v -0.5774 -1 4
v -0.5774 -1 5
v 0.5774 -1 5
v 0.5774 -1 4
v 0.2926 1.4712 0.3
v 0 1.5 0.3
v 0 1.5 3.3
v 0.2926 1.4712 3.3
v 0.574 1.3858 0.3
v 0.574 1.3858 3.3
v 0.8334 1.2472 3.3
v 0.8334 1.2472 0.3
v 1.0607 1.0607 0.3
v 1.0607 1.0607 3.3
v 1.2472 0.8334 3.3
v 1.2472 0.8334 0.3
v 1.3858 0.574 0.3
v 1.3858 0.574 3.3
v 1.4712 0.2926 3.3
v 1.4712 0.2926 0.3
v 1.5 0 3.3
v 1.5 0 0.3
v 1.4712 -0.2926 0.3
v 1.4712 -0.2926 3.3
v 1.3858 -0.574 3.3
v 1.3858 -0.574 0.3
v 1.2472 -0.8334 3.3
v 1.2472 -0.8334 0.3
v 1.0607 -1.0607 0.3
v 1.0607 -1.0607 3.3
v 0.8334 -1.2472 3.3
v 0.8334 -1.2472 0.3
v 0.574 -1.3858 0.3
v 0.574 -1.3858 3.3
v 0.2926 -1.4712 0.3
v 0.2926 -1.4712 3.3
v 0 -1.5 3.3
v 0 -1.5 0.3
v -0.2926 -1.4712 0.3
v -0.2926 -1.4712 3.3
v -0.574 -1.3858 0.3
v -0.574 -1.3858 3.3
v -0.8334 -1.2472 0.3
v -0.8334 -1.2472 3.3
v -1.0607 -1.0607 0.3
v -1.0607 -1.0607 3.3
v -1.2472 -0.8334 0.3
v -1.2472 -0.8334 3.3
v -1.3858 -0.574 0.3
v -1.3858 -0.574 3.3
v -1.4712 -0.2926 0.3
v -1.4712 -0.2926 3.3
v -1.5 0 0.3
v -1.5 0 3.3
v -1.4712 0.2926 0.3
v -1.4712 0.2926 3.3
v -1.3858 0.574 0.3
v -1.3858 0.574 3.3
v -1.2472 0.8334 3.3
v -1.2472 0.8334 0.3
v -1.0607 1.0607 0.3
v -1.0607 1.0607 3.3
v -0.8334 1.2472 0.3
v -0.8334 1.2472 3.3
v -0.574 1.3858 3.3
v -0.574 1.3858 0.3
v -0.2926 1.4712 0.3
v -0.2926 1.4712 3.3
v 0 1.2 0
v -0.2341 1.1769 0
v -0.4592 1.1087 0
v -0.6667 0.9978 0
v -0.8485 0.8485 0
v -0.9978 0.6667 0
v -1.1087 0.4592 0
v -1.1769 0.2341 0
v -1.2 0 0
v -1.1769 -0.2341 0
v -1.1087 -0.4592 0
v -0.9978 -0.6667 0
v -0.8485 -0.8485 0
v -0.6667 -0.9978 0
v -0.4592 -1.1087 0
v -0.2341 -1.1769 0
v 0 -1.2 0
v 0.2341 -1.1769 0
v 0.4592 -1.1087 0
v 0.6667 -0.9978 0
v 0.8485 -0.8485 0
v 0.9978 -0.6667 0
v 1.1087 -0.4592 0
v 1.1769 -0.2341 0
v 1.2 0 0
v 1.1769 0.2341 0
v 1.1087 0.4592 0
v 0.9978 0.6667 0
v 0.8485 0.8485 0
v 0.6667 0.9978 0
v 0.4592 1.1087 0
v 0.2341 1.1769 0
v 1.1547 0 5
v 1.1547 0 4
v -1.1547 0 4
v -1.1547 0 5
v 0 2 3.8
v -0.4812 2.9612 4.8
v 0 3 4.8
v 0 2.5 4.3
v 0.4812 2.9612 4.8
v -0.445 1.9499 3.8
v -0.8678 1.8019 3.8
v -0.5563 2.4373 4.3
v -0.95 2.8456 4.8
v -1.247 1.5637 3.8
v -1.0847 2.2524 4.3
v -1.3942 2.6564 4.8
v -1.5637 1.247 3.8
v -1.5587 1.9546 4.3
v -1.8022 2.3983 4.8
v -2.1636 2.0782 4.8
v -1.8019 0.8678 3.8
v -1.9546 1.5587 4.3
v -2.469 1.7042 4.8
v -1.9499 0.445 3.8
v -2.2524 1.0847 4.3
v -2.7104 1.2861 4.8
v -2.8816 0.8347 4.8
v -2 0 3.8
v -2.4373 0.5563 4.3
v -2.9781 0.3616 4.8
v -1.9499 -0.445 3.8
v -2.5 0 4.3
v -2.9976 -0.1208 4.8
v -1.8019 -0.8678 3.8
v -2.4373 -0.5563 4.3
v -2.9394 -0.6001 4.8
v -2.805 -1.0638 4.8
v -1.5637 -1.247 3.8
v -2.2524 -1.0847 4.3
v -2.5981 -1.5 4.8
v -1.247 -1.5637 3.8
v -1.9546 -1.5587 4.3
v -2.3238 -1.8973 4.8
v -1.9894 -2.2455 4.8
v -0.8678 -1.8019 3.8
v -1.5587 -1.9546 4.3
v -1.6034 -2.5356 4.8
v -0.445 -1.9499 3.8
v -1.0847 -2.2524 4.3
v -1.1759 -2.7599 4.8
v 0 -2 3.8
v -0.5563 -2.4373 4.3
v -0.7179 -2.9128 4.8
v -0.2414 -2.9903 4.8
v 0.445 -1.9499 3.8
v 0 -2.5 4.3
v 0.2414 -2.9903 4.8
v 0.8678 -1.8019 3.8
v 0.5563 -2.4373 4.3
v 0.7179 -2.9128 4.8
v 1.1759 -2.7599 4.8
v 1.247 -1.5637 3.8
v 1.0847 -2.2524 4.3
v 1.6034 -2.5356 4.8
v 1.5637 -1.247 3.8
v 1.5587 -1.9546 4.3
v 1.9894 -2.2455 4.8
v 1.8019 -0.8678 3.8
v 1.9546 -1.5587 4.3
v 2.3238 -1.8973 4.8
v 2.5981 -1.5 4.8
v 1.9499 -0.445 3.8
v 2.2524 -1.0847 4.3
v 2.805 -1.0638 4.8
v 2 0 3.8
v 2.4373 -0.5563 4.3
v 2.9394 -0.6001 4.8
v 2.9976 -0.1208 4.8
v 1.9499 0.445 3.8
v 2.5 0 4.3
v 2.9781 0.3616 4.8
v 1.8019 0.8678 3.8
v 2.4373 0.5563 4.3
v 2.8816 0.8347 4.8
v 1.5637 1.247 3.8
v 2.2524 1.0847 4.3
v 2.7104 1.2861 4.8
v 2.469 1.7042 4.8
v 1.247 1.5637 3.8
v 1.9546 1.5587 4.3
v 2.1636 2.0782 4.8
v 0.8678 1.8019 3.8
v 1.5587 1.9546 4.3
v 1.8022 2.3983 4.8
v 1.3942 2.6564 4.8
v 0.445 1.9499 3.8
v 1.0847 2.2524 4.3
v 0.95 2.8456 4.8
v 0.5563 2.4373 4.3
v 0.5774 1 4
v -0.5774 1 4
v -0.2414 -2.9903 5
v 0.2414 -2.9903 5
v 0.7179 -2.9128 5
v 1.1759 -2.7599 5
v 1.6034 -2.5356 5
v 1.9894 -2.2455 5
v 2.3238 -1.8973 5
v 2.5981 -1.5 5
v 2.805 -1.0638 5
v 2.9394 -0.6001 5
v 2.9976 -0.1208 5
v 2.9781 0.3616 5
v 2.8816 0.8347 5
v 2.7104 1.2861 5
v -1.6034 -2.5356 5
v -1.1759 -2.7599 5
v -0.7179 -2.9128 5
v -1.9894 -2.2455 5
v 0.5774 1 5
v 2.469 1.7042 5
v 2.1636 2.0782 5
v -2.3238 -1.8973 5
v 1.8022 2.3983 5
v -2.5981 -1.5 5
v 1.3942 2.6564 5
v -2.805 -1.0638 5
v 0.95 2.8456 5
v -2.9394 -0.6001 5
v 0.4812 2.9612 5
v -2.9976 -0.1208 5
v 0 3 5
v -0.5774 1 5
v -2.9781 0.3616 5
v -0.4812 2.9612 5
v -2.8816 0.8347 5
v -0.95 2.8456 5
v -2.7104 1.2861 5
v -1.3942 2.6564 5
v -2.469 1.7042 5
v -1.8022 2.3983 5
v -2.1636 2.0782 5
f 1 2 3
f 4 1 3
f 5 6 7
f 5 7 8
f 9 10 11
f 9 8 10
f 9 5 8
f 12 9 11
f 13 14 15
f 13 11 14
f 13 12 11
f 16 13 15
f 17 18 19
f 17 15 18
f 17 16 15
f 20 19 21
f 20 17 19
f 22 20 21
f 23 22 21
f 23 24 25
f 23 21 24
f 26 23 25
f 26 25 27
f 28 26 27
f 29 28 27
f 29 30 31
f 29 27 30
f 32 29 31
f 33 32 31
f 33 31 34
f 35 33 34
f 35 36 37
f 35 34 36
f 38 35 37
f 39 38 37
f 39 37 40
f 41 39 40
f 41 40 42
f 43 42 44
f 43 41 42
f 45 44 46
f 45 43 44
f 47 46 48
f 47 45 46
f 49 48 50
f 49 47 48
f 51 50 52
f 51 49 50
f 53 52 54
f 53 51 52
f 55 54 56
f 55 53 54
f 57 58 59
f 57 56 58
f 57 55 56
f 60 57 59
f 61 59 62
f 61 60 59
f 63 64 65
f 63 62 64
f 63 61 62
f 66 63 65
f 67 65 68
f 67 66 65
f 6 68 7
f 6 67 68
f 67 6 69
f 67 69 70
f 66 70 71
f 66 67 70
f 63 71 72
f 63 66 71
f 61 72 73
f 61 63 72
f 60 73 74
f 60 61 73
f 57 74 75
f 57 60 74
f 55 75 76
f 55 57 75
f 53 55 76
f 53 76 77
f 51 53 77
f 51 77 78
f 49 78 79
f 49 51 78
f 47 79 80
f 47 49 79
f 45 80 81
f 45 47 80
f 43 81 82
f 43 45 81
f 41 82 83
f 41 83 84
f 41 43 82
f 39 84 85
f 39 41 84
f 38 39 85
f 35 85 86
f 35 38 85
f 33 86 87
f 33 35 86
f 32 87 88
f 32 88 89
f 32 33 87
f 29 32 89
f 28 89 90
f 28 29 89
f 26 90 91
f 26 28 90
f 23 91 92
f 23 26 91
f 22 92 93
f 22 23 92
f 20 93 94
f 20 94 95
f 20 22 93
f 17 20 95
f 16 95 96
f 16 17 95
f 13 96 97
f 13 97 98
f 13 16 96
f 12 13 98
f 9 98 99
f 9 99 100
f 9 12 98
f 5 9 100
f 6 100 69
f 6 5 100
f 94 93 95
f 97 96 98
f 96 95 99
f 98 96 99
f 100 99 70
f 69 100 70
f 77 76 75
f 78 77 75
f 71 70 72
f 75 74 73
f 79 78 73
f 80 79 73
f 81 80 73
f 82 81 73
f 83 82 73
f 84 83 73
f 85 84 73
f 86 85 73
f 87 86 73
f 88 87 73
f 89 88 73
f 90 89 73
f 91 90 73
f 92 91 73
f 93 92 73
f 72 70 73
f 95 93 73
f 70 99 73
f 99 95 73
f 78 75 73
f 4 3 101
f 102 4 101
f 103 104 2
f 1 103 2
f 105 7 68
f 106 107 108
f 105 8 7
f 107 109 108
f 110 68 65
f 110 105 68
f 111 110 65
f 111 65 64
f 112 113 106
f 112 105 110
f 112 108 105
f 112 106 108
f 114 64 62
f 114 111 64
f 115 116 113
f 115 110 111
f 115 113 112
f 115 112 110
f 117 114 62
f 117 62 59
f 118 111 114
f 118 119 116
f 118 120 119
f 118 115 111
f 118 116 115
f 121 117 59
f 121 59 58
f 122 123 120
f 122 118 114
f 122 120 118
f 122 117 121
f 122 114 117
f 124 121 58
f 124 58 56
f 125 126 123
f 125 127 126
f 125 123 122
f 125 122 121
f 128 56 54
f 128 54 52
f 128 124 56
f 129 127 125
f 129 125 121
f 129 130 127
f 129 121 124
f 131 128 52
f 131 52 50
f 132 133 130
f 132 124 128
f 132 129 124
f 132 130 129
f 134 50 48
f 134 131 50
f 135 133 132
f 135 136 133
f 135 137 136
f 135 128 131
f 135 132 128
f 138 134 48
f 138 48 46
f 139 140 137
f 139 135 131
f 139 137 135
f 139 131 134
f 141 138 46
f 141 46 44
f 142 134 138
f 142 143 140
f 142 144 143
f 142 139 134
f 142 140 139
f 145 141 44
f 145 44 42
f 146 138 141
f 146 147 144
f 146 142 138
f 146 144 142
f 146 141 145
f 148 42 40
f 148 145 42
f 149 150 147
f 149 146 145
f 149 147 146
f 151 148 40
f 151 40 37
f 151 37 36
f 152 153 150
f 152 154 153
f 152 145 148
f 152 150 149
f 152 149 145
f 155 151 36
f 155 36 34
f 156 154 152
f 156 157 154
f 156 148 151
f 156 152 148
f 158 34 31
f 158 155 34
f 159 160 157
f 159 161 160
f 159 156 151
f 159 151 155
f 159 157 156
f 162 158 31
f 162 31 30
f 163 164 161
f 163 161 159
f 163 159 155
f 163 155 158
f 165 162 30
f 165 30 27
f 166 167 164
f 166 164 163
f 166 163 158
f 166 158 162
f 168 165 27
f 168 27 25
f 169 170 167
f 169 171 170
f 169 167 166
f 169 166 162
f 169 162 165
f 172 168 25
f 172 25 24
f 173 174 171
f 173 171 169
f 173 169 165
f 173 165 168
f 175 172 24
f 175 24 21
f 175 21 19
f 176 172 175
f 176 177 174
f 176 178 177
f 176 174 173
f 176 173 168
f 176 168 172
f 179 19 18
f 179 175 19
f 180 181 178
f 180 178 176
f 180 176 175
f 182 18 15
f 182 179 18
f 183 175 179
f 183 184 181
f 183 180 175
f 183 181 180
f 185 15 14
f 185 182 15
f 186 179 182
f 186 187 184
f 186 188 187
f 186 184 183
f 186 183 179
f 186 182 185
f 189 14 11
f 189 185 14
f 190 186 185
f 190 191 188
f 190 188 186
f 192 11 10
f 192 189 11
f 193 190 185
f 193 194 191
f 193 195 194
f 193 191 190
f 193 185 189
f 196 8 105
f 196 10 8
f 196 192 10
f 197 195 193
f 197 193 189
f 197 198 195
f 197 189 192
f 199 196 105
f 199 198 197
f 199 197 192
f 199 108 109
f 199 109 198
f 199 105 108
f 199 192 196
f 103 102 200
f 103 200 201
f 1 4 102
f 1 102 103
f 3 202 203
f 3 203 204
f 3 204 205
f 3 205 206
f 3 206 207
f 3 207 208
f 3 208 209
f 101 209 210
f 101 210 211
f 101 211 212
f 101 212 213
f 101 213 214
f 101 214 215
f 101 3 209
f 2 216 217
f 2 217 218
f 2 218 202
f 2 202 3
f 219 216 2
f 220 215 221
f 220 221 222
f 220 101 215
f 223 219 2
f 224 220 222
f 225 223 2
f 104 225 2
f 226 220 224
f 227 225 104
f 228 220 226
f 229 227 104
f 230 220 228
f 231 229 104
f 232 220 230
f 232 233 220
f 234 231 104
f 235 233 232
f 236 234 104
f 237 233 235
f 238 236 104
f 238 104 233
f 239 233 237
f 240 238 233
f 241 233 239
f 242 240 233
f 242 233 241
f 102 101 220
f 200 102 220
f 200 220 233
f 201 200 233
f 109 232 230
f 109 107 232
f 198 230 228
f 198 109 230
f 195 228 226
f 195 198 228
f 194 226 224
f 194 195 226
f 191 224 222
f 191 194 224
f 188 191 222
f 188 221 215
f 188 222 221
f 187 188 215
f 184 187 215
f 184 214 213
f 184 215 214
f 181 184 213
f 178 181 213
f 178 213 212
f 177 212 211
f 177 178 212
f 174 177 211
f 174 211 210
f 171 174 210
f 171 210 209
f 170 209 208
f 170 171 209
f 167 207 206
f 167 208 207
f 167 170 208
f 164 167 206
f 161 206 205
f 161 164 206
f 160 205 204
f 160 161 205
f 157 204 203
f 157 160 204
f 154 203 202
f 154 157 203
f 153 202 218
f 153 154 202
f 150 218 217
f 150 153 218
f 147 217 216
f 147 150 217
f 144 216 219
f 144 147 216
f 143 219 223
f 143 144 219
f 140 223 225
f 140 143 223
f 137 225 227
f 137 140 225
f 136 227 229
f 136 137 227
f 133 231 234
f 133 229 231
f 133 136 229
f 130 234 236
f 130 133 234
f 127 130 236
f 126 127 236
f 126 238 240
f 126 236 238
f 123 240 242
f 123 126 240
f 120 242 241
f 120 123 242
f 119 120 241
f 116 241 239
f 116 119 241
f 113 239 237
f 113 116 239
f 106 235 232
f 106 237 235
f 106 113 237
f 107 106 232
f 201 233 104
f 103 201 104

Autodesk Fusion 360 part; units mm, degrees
sketch "Sketch1" plane through (0, 0, 0) normal (1, 0, 0) x (0, 1, 0)
  line L0 (0, 5) -> (3, 5)
  line L1 (3, 5) -> (3, 4.8)
  line L2 (3, 4.8) -> (1.5, 3.3)
  line L3 (1.5, 3.3) -> (1.5, 0.3)
  line L4 (1.2, 0) -> (0, 0)
  line L5 (0, 0) -> (0, 5)
  line L6 (1.5, 0.3) -> (1.2, 0)
  point P0 (1.5, 0)
  dimension "d1" = 1.5
  dimension "d3" = 5
  dimension "d4" = 1.7
  dimension "d5" = 135
  dimension "d6" = 3
  dimension "d9" = 0.3
  dimension "d10" = 0.3
revolve "Revolve1" add sketch "Sketch1" angle 360 about axis through (0, 0, 0) along (0, 0, 1)
sketch "Sketch2" plane through (0, 0, 5) normal (0, 0, 1) x (-1, 0, 0)
  circle A0 centre (0, 0) radius 3
  line L0 (0.5774, -1) -> (1.1547, 0)
  line L1 (1.1547, 0) -> (0.5774, 1)
  line L2 (0.5774, 1) -> (-0.5774, 1)
  line L3 (-0.5774, 1) -> (-1.1547, 0)
  line L4 (-1.1547, 0) -> (-0.5774, -1)
  line L5 (-0.5774, -1) -> (0.5774, -1)
  dimension "d11" = 1
extrude "Extrude1" cut sketch "Sketch2" against normal blind 1 contours L0 L1 L2 L3 L4 L5
equation "d1 = ( 3 / 2 ) * 1 mm"
equation "d3 = Length"
equation "d4 = Head_Length"
equation "d6 = Head_Diameter / 2"
equation "Length = 5 mm"
equation "d10 = d9"
equation "Head_Diameter = 6 mm"
equation "Head_Length = 1.7 mm"
properties part number "M3x5mm FHCS"
